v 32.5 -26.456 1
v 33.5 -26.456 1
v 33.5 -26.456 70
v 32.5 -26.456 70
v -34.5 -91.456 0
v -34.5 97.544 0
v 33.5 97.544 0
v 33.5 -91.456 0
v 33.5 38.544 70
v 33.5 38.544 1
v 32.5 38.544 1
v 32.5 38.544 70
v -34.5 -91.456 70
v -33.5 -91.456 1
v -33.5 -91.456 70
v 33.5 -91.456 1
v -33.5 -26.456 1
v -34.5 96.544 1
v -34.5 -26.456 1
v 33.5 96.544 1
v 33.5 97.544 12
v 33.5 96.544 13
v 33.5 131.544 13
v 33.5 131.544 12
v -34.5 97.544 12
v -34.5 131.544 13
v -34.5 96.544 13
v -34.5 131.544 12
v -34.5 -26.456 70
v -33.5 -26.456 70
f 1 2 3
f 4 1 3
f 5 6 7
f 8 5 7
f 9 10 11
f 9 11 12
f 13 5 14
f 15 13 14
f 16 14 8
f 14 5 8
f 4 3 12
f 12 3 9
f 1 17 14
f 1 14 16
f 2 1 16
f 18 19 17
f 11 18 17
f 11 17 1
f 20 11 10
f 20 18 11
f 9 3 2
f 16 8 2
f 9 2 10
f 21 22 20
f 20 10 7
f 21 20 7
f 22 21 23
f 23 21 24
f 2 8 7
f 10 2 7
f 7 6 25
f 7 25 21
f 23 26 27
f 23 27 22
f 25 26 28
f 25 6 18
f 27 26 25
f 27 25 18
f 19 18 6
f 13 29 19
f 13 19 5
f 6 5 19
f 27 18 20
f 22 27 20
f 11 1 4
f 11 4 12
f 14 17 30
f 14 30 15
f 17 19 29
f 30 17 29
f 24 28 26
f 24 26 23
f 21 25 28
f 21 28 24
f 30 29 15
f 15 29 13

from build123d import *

# Parameters (mm, degrees)
F0_W     = 68
F0_H     = 188
F1_DEPTH = 1
F0_H_2   = 35
F2_DEPTH = 13
F3_W     = 68
F3_H     = 34
F4_DEPTH = 12
F5_W     = 65
F5_H     = 69
F6_DEPTH = 1
F7_W     = 65
F7_H     = 69
F8_DEPTH = 1


# Not quite as in the source:
# - a feature names something its author has since deleted; it is built from what else it names


with BuildPart() as f1:
    # F0 (on Top) → F1 (new body)
    with BuildSketch(Plane.XY):
        with Locations((145.9408301511, 2.5440129265)):
            Rectangle(F0_W, F0_H)
    extrude(amount=F1_DEPTH)

    # F0 (on Top) → F2 (join)
    with BuildSketch(Plane.XY):
        with Locations((145.9408301511, 114.0440129265)):
            Rectangle(F0_W, F0_H_2)
    extrude(amount=F2_DEPTH)

    # F3 (on face) → F4 (cut)
    with BuildSketch(Plane(origin=(0, 0, 0), x_dir=(1, 0, 0), z_dir=(0, 0, -1))):
        with Locations((145.9408301511, -114.5440129265)):
            Rectangle(F3_W, F3_H)
    extrude(amount=-F4_DEPTH, mode=Mode.SUBTRACT)

    # F5 (on face) → F6 (join)
    with BuildSketch(Plane.YZ.offset(179.9408301511)):
        with Locations((6.0440129265, 35.5)):
            Rectangle(F5_W, F5_H)
    extrude(amount=-F6_DEPTH)

    # F7 (on face) → F8 (join)
    with BuildSketch(Plane(origin=(111.9408301511, 0, 0), x_dir=(0, -1, 0), z_dir=(-1, 0, 0))):
        with Locations((58.9559870735, 35.5)):
            Rectangle(F7_W, F7_H)
    extrude(amount=-F8_DEPTH)


with BuildPart() as f1_1:
    # F9: moved
    add(f1.part.moved(Location((-146.441, 0, 0))))


solid = f1_1.part
